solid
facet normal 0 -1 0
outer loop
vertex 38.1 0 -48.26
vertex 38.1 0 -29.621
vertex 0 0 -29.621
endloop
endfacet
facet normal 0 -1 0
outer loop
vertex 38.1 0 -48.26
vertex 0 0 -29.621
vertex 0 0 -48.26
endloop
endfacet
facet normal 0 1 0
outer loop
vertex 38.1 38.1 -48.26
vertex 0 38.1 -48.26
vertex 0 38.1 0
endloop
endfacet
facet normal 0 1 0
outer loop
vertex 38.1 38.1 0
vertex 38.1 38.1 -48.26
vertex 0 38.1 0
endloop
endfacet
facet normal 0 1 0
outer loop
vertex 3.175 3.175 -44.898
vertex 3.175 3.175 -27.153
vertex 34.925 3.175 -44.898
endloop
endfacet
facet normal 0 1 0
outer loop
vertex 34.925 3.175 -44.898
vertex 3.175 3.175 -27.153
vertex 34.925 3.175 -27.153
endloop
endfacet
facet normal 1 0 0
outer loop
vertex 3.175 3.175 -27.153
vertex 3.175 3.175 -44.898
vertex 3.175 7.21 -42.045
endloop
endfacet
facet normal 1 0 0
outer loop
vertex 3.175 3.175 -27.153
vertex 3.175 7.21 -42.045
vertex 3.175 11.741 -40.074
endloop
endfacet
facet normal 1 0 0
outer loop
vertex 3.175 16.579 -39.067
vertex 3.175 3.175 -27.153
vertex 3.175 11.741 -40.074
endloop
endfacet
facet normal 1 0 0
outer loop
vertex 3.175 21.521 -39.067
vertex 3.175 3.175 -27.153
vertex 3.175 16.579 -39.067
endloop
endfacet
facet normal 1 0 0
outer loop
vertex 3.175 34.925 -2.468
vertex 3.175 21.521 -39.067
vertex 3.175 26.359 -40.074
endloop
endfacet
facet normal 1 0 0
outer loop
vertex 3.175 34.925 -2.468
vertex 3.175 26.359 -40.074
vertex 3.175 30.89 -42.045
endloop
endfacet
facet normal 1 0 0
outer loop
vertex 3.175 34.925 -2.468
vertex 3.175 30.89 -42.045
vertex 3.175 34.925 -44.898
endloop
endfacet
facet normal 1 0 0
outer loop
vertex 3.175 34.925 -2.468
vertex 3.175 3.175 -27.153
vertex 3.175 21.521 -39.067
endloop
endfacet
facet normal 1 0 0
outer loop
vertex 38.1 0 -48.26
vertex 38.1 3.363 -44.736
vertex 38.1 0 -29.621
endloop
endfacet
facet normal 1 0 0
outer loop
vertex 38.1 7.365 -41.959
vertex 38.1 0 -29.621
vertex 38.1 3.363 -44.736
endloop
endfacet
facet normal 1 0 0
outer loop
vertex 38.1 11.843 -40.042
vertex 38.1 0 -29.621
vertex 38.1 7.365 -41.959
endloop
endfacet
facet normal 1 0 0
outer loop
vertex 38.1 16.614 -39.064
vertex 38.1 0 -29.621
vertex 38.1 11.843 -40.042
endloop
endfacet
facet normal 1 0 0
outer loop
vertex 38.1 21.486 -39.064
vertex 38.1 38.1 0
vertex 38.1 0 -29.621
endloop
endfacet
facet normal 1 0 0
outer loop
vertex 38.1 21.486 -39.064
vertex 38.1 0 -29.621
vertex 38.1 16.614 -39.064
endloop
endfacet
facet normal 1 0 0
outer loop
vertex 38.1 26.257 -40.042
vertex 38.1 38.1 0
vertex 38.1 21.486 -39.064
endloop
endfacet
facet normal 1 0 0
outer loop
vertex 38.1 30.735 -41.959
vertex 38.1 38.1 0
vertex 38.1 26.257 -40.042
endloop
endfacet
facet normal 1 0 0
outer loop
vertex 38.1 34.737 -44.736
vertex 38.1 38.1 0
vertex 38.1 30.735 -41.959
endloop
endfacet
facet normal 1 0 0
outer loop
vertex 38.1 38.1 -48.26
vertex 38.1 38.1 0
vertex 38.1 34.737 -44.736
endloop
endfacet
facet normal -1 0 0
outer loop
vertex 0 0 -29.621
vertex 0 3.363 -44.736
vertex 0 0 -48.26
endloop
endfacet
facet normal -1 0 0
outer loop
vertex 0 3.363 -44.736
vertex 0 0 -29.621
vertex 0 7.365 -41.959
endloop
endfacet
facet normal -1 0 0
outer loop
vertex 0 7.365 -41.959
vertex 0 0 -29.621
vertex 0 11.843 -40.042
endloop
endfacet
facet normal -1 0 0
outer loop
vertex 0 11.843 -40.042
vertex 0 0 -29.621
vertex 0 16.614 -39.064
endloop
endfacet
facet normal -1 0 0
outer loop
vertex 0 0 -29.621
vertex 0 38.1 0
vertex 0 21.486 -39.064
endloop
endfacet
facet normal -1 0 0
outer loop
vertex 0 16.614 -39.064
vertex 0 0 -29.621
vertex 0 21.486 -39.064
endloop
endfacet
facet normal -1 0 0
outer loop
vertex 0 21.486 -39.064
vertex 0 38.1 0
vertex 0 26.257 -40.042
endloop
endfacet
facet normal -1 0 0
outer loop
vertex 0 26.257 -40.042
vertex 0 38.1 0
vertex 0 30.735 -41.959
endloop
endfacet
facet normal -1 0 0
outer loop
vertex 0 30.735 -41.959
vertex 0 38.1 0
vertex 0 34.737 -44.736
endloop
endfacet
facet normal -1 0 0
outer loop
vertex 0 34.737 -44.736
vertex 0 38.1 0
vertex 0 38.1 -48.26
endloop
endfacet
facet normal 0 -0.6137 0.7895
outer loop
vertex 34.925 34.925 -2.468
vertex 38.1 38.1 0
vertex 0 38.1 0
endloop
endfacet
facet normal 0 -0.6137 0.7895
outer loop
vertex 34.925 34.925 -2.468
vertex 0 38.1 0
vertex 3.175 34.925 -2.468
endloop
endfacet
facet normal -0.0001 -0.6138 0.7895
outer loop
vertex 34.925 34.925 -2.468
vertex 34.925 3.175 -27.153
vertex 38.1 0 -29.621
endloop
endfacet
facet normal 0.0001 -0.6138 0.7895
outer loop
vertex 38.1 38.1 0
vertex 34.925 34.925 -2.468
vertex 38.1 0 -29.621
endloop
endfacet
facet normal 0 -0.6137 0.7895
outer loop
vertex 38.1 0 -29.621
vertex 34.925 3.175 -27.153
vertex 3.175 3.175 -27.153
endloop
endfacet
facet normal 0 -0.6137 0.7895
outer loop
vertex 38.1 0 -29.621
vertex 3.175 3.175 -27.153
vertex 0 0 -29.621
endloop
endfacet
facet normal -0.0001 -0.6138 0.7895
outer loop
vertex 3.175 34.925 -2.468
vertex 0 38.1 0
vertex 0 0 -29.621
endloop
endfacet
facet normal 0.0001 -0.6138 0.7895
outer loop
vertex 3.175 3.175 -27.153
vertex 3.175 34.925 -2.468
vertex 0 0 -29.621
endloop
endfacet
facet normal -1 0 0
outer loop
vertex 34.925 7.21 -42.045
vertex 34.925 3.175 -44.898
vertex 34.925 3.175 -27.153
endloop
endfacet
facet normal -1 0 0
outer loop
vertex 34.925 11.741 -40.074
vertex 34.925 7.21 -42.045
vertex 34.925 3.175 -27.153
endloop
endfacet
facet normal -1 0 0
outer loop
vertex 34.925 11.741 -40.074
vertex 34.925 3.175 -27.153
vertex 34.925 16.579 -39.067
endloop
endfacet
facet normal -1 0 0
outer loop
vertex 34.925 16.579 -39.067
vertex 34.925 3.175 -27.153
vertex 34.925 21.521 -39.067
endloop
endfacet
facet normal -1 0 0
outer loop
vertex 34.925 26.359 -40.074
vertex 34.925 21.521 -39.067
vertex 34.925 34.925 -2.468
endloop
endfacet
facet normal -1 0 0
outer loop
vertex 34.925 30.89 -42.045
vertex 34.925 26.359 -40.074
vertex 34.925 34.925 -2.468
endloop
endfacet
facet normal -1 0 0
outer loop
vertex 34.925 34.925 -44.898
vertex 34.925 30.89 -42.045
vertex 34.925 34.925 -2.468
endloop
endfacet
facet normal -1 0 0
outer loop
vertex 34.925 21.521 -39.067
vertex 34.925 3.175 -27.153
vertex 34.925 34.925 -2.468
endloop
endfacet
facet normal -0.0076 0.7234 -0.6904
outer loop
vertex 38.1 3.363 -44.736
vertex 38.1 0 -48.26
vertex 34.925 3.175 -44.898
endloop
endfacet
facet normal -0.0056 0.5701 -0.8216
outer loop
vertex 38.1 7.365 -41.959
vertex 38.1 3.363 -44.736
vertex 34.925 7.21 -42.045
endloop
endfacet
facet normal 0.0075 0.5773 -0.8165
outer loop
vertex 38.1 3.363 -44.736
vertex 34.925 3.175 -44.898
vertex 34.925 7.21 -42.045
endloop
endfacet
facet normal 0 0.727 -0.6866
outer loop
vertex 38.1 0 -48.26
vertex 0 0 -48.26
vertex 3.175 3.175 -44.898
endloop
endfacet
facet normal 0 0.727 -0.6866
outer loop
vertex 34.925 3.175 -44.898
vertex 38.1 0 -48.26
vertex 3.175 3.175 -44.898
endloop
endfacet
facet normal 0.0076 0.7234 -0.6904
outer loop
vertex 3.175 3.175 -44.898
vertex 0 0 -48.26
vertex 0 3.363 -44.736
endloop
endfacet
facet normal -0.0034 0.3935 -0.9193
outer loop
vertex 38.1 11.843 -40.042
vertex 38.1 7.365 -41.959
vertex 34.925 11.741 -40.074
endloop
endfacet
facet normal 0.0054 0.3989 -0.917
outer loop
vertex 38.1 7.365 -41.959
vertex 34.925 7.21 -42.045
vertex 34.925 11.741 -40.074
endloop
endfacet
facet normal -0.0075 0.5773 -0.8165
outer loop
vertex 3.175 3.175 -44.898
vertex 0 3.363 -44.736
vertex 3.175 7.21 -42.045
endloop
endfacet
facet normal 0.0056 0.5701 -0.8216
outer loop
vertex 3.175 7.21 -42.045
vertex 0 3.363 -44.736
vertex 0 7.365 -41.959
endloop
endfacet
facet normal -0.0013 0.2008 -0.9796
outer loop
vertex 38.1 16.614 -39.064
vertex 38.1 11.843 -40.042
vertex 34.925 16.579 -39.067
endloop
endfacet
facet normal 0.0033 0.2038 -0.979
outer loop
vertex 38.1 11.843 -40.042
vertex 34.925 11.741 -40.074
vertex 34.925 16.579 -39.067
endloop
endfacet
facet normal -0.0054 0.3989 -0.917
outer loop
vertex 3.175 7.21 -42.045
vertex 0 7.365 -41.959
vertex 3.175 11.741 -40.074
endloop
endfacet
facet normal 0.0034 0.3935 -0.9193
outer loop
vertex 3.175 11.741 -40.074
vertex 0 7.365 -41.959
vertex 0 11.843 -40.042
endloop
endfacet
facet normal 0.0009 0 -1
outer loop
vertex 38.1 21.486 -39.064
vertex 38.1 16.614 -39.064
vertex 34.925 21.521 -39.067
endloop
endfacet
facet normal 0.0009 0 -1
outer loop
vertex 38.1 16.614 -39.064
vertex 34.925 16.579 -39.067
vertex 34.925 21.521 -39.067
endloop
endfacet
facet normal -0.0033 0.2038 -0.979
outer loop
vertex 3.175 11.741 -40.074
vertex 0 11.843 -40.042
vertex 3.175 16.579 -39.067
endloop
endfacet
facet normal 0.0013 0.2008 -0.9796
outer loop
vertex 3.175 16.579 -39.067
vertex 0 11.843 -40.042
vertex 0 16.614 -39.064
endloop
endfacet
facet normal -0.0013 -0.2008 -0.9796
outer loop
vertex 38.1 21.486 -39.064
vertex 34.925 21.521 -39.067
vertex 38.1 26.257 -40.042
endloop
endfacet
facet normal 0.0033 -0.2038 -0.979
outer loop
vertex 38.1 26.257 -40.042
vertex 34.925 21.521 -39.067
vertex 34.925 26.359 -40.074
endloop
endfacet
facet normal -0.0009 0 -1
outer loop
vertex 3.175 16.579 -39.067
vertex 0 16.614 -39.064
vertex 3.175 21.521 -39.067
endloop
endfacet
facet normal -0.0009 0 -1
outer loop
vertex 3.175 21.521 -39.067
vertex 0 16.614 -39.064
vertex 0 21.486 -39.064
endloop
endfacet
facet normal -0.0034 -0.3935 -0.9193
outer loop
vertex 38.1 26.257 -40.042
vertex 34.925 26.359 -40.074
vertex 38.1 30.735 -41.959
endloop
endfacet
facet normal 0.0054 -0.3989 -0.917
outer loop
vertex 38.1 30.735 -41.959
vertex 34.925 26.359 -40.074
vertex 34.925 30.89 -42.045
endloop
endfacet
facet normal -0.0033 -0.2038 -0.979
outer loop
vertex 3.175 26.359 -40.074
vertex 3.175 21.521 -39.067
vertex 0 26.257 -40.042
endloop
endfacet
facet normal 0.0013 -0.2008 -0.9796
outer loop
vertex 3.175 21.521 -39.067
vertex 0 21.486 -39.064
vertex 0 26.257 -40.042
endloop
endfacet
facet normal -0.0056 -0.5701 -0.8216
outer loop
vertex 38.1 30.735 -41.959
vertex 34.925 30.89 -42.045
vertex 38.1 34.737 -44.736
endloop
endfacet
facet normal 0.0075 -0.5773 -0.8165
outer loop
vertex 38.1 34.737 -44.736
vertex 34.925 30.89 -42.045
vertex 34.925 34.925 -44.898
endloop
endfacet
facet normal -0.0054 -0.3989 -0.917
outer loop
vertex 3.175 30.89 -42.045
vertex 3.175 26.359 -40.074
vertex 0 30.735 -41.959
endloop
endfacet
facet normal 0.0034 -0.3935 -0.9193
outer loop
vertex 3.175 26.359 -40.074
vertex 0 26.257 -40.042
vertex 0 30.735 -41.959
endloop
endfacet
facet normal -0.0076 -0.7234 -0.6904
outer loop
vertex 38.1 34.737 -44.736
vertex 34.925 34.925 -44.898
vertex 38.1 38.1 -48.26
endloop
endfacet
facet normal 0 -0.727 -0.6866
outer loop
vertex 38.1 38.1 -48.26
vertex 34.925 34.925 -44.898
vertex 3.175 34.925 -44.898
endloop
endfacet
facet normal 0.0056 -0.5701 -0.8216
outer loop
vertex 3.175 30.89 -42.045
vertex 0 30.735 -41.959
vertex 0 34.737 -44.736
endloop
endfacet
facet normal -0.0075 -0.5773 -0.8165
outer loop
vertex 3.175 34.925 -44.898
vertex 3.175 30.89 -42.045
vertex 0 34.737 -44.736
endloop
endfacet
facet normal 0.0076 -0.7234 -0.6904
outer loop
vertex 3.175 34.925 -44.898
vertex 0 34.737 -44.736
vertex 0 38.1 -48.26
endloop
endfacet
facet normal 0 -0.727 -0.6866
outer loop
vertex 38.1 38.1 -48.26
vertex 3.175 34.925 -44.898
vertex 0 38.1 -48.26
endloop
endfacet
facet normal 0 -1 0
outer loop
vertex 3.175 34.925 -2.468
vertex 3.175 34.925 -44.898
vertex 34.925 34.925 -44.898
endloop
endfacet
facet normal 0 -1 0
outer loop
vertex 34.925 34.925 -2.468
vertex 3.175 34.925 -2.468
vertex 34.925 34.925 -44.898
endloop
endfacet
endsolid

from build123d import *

# Parameters (mm, degrees)
BOSS_EXTRUDE1_DEPTH = 38.1
SKETCH2_W           = 31.75
SKETCH2_H           = 31.75
CUT_EXTRUDE1_DEPTH  = 73.334276799


with BuildPart() as part:
    # Sketch1 → Boss-Extrude1 (new body)
    with BuildSketch(Plane(origin=(0, 0, 0), x_dir=(0, 0, -1), z_dir=(1, 0, 0))):
        with BuildLine():
            Line((48.26, 38.1), (0, 38.1))
            Line((0, 38.1), (29.621235626, 0))
            Line((29.621235626, 0), (48.26, 0))
            ThreePointArc((48.26, 0), (38.940617813, 19.05), (48.26, 38.1))
        make_face()
    extrude(amount=BOSS_EXTRUDE1_DEPTH)

    # Sketch2 → Cut-Extrude1 (cut, through all)
    with BuildSketch(Plane.XY):
        with Locations((19.05, 19.05)):
            Rectangle(SKETCH2_W, SKETCH2_H)
    extrude(amount=-CUT_EXTRUDE1_DEPTH, mode=Mode.SUBTRACT)


solid = part.part
